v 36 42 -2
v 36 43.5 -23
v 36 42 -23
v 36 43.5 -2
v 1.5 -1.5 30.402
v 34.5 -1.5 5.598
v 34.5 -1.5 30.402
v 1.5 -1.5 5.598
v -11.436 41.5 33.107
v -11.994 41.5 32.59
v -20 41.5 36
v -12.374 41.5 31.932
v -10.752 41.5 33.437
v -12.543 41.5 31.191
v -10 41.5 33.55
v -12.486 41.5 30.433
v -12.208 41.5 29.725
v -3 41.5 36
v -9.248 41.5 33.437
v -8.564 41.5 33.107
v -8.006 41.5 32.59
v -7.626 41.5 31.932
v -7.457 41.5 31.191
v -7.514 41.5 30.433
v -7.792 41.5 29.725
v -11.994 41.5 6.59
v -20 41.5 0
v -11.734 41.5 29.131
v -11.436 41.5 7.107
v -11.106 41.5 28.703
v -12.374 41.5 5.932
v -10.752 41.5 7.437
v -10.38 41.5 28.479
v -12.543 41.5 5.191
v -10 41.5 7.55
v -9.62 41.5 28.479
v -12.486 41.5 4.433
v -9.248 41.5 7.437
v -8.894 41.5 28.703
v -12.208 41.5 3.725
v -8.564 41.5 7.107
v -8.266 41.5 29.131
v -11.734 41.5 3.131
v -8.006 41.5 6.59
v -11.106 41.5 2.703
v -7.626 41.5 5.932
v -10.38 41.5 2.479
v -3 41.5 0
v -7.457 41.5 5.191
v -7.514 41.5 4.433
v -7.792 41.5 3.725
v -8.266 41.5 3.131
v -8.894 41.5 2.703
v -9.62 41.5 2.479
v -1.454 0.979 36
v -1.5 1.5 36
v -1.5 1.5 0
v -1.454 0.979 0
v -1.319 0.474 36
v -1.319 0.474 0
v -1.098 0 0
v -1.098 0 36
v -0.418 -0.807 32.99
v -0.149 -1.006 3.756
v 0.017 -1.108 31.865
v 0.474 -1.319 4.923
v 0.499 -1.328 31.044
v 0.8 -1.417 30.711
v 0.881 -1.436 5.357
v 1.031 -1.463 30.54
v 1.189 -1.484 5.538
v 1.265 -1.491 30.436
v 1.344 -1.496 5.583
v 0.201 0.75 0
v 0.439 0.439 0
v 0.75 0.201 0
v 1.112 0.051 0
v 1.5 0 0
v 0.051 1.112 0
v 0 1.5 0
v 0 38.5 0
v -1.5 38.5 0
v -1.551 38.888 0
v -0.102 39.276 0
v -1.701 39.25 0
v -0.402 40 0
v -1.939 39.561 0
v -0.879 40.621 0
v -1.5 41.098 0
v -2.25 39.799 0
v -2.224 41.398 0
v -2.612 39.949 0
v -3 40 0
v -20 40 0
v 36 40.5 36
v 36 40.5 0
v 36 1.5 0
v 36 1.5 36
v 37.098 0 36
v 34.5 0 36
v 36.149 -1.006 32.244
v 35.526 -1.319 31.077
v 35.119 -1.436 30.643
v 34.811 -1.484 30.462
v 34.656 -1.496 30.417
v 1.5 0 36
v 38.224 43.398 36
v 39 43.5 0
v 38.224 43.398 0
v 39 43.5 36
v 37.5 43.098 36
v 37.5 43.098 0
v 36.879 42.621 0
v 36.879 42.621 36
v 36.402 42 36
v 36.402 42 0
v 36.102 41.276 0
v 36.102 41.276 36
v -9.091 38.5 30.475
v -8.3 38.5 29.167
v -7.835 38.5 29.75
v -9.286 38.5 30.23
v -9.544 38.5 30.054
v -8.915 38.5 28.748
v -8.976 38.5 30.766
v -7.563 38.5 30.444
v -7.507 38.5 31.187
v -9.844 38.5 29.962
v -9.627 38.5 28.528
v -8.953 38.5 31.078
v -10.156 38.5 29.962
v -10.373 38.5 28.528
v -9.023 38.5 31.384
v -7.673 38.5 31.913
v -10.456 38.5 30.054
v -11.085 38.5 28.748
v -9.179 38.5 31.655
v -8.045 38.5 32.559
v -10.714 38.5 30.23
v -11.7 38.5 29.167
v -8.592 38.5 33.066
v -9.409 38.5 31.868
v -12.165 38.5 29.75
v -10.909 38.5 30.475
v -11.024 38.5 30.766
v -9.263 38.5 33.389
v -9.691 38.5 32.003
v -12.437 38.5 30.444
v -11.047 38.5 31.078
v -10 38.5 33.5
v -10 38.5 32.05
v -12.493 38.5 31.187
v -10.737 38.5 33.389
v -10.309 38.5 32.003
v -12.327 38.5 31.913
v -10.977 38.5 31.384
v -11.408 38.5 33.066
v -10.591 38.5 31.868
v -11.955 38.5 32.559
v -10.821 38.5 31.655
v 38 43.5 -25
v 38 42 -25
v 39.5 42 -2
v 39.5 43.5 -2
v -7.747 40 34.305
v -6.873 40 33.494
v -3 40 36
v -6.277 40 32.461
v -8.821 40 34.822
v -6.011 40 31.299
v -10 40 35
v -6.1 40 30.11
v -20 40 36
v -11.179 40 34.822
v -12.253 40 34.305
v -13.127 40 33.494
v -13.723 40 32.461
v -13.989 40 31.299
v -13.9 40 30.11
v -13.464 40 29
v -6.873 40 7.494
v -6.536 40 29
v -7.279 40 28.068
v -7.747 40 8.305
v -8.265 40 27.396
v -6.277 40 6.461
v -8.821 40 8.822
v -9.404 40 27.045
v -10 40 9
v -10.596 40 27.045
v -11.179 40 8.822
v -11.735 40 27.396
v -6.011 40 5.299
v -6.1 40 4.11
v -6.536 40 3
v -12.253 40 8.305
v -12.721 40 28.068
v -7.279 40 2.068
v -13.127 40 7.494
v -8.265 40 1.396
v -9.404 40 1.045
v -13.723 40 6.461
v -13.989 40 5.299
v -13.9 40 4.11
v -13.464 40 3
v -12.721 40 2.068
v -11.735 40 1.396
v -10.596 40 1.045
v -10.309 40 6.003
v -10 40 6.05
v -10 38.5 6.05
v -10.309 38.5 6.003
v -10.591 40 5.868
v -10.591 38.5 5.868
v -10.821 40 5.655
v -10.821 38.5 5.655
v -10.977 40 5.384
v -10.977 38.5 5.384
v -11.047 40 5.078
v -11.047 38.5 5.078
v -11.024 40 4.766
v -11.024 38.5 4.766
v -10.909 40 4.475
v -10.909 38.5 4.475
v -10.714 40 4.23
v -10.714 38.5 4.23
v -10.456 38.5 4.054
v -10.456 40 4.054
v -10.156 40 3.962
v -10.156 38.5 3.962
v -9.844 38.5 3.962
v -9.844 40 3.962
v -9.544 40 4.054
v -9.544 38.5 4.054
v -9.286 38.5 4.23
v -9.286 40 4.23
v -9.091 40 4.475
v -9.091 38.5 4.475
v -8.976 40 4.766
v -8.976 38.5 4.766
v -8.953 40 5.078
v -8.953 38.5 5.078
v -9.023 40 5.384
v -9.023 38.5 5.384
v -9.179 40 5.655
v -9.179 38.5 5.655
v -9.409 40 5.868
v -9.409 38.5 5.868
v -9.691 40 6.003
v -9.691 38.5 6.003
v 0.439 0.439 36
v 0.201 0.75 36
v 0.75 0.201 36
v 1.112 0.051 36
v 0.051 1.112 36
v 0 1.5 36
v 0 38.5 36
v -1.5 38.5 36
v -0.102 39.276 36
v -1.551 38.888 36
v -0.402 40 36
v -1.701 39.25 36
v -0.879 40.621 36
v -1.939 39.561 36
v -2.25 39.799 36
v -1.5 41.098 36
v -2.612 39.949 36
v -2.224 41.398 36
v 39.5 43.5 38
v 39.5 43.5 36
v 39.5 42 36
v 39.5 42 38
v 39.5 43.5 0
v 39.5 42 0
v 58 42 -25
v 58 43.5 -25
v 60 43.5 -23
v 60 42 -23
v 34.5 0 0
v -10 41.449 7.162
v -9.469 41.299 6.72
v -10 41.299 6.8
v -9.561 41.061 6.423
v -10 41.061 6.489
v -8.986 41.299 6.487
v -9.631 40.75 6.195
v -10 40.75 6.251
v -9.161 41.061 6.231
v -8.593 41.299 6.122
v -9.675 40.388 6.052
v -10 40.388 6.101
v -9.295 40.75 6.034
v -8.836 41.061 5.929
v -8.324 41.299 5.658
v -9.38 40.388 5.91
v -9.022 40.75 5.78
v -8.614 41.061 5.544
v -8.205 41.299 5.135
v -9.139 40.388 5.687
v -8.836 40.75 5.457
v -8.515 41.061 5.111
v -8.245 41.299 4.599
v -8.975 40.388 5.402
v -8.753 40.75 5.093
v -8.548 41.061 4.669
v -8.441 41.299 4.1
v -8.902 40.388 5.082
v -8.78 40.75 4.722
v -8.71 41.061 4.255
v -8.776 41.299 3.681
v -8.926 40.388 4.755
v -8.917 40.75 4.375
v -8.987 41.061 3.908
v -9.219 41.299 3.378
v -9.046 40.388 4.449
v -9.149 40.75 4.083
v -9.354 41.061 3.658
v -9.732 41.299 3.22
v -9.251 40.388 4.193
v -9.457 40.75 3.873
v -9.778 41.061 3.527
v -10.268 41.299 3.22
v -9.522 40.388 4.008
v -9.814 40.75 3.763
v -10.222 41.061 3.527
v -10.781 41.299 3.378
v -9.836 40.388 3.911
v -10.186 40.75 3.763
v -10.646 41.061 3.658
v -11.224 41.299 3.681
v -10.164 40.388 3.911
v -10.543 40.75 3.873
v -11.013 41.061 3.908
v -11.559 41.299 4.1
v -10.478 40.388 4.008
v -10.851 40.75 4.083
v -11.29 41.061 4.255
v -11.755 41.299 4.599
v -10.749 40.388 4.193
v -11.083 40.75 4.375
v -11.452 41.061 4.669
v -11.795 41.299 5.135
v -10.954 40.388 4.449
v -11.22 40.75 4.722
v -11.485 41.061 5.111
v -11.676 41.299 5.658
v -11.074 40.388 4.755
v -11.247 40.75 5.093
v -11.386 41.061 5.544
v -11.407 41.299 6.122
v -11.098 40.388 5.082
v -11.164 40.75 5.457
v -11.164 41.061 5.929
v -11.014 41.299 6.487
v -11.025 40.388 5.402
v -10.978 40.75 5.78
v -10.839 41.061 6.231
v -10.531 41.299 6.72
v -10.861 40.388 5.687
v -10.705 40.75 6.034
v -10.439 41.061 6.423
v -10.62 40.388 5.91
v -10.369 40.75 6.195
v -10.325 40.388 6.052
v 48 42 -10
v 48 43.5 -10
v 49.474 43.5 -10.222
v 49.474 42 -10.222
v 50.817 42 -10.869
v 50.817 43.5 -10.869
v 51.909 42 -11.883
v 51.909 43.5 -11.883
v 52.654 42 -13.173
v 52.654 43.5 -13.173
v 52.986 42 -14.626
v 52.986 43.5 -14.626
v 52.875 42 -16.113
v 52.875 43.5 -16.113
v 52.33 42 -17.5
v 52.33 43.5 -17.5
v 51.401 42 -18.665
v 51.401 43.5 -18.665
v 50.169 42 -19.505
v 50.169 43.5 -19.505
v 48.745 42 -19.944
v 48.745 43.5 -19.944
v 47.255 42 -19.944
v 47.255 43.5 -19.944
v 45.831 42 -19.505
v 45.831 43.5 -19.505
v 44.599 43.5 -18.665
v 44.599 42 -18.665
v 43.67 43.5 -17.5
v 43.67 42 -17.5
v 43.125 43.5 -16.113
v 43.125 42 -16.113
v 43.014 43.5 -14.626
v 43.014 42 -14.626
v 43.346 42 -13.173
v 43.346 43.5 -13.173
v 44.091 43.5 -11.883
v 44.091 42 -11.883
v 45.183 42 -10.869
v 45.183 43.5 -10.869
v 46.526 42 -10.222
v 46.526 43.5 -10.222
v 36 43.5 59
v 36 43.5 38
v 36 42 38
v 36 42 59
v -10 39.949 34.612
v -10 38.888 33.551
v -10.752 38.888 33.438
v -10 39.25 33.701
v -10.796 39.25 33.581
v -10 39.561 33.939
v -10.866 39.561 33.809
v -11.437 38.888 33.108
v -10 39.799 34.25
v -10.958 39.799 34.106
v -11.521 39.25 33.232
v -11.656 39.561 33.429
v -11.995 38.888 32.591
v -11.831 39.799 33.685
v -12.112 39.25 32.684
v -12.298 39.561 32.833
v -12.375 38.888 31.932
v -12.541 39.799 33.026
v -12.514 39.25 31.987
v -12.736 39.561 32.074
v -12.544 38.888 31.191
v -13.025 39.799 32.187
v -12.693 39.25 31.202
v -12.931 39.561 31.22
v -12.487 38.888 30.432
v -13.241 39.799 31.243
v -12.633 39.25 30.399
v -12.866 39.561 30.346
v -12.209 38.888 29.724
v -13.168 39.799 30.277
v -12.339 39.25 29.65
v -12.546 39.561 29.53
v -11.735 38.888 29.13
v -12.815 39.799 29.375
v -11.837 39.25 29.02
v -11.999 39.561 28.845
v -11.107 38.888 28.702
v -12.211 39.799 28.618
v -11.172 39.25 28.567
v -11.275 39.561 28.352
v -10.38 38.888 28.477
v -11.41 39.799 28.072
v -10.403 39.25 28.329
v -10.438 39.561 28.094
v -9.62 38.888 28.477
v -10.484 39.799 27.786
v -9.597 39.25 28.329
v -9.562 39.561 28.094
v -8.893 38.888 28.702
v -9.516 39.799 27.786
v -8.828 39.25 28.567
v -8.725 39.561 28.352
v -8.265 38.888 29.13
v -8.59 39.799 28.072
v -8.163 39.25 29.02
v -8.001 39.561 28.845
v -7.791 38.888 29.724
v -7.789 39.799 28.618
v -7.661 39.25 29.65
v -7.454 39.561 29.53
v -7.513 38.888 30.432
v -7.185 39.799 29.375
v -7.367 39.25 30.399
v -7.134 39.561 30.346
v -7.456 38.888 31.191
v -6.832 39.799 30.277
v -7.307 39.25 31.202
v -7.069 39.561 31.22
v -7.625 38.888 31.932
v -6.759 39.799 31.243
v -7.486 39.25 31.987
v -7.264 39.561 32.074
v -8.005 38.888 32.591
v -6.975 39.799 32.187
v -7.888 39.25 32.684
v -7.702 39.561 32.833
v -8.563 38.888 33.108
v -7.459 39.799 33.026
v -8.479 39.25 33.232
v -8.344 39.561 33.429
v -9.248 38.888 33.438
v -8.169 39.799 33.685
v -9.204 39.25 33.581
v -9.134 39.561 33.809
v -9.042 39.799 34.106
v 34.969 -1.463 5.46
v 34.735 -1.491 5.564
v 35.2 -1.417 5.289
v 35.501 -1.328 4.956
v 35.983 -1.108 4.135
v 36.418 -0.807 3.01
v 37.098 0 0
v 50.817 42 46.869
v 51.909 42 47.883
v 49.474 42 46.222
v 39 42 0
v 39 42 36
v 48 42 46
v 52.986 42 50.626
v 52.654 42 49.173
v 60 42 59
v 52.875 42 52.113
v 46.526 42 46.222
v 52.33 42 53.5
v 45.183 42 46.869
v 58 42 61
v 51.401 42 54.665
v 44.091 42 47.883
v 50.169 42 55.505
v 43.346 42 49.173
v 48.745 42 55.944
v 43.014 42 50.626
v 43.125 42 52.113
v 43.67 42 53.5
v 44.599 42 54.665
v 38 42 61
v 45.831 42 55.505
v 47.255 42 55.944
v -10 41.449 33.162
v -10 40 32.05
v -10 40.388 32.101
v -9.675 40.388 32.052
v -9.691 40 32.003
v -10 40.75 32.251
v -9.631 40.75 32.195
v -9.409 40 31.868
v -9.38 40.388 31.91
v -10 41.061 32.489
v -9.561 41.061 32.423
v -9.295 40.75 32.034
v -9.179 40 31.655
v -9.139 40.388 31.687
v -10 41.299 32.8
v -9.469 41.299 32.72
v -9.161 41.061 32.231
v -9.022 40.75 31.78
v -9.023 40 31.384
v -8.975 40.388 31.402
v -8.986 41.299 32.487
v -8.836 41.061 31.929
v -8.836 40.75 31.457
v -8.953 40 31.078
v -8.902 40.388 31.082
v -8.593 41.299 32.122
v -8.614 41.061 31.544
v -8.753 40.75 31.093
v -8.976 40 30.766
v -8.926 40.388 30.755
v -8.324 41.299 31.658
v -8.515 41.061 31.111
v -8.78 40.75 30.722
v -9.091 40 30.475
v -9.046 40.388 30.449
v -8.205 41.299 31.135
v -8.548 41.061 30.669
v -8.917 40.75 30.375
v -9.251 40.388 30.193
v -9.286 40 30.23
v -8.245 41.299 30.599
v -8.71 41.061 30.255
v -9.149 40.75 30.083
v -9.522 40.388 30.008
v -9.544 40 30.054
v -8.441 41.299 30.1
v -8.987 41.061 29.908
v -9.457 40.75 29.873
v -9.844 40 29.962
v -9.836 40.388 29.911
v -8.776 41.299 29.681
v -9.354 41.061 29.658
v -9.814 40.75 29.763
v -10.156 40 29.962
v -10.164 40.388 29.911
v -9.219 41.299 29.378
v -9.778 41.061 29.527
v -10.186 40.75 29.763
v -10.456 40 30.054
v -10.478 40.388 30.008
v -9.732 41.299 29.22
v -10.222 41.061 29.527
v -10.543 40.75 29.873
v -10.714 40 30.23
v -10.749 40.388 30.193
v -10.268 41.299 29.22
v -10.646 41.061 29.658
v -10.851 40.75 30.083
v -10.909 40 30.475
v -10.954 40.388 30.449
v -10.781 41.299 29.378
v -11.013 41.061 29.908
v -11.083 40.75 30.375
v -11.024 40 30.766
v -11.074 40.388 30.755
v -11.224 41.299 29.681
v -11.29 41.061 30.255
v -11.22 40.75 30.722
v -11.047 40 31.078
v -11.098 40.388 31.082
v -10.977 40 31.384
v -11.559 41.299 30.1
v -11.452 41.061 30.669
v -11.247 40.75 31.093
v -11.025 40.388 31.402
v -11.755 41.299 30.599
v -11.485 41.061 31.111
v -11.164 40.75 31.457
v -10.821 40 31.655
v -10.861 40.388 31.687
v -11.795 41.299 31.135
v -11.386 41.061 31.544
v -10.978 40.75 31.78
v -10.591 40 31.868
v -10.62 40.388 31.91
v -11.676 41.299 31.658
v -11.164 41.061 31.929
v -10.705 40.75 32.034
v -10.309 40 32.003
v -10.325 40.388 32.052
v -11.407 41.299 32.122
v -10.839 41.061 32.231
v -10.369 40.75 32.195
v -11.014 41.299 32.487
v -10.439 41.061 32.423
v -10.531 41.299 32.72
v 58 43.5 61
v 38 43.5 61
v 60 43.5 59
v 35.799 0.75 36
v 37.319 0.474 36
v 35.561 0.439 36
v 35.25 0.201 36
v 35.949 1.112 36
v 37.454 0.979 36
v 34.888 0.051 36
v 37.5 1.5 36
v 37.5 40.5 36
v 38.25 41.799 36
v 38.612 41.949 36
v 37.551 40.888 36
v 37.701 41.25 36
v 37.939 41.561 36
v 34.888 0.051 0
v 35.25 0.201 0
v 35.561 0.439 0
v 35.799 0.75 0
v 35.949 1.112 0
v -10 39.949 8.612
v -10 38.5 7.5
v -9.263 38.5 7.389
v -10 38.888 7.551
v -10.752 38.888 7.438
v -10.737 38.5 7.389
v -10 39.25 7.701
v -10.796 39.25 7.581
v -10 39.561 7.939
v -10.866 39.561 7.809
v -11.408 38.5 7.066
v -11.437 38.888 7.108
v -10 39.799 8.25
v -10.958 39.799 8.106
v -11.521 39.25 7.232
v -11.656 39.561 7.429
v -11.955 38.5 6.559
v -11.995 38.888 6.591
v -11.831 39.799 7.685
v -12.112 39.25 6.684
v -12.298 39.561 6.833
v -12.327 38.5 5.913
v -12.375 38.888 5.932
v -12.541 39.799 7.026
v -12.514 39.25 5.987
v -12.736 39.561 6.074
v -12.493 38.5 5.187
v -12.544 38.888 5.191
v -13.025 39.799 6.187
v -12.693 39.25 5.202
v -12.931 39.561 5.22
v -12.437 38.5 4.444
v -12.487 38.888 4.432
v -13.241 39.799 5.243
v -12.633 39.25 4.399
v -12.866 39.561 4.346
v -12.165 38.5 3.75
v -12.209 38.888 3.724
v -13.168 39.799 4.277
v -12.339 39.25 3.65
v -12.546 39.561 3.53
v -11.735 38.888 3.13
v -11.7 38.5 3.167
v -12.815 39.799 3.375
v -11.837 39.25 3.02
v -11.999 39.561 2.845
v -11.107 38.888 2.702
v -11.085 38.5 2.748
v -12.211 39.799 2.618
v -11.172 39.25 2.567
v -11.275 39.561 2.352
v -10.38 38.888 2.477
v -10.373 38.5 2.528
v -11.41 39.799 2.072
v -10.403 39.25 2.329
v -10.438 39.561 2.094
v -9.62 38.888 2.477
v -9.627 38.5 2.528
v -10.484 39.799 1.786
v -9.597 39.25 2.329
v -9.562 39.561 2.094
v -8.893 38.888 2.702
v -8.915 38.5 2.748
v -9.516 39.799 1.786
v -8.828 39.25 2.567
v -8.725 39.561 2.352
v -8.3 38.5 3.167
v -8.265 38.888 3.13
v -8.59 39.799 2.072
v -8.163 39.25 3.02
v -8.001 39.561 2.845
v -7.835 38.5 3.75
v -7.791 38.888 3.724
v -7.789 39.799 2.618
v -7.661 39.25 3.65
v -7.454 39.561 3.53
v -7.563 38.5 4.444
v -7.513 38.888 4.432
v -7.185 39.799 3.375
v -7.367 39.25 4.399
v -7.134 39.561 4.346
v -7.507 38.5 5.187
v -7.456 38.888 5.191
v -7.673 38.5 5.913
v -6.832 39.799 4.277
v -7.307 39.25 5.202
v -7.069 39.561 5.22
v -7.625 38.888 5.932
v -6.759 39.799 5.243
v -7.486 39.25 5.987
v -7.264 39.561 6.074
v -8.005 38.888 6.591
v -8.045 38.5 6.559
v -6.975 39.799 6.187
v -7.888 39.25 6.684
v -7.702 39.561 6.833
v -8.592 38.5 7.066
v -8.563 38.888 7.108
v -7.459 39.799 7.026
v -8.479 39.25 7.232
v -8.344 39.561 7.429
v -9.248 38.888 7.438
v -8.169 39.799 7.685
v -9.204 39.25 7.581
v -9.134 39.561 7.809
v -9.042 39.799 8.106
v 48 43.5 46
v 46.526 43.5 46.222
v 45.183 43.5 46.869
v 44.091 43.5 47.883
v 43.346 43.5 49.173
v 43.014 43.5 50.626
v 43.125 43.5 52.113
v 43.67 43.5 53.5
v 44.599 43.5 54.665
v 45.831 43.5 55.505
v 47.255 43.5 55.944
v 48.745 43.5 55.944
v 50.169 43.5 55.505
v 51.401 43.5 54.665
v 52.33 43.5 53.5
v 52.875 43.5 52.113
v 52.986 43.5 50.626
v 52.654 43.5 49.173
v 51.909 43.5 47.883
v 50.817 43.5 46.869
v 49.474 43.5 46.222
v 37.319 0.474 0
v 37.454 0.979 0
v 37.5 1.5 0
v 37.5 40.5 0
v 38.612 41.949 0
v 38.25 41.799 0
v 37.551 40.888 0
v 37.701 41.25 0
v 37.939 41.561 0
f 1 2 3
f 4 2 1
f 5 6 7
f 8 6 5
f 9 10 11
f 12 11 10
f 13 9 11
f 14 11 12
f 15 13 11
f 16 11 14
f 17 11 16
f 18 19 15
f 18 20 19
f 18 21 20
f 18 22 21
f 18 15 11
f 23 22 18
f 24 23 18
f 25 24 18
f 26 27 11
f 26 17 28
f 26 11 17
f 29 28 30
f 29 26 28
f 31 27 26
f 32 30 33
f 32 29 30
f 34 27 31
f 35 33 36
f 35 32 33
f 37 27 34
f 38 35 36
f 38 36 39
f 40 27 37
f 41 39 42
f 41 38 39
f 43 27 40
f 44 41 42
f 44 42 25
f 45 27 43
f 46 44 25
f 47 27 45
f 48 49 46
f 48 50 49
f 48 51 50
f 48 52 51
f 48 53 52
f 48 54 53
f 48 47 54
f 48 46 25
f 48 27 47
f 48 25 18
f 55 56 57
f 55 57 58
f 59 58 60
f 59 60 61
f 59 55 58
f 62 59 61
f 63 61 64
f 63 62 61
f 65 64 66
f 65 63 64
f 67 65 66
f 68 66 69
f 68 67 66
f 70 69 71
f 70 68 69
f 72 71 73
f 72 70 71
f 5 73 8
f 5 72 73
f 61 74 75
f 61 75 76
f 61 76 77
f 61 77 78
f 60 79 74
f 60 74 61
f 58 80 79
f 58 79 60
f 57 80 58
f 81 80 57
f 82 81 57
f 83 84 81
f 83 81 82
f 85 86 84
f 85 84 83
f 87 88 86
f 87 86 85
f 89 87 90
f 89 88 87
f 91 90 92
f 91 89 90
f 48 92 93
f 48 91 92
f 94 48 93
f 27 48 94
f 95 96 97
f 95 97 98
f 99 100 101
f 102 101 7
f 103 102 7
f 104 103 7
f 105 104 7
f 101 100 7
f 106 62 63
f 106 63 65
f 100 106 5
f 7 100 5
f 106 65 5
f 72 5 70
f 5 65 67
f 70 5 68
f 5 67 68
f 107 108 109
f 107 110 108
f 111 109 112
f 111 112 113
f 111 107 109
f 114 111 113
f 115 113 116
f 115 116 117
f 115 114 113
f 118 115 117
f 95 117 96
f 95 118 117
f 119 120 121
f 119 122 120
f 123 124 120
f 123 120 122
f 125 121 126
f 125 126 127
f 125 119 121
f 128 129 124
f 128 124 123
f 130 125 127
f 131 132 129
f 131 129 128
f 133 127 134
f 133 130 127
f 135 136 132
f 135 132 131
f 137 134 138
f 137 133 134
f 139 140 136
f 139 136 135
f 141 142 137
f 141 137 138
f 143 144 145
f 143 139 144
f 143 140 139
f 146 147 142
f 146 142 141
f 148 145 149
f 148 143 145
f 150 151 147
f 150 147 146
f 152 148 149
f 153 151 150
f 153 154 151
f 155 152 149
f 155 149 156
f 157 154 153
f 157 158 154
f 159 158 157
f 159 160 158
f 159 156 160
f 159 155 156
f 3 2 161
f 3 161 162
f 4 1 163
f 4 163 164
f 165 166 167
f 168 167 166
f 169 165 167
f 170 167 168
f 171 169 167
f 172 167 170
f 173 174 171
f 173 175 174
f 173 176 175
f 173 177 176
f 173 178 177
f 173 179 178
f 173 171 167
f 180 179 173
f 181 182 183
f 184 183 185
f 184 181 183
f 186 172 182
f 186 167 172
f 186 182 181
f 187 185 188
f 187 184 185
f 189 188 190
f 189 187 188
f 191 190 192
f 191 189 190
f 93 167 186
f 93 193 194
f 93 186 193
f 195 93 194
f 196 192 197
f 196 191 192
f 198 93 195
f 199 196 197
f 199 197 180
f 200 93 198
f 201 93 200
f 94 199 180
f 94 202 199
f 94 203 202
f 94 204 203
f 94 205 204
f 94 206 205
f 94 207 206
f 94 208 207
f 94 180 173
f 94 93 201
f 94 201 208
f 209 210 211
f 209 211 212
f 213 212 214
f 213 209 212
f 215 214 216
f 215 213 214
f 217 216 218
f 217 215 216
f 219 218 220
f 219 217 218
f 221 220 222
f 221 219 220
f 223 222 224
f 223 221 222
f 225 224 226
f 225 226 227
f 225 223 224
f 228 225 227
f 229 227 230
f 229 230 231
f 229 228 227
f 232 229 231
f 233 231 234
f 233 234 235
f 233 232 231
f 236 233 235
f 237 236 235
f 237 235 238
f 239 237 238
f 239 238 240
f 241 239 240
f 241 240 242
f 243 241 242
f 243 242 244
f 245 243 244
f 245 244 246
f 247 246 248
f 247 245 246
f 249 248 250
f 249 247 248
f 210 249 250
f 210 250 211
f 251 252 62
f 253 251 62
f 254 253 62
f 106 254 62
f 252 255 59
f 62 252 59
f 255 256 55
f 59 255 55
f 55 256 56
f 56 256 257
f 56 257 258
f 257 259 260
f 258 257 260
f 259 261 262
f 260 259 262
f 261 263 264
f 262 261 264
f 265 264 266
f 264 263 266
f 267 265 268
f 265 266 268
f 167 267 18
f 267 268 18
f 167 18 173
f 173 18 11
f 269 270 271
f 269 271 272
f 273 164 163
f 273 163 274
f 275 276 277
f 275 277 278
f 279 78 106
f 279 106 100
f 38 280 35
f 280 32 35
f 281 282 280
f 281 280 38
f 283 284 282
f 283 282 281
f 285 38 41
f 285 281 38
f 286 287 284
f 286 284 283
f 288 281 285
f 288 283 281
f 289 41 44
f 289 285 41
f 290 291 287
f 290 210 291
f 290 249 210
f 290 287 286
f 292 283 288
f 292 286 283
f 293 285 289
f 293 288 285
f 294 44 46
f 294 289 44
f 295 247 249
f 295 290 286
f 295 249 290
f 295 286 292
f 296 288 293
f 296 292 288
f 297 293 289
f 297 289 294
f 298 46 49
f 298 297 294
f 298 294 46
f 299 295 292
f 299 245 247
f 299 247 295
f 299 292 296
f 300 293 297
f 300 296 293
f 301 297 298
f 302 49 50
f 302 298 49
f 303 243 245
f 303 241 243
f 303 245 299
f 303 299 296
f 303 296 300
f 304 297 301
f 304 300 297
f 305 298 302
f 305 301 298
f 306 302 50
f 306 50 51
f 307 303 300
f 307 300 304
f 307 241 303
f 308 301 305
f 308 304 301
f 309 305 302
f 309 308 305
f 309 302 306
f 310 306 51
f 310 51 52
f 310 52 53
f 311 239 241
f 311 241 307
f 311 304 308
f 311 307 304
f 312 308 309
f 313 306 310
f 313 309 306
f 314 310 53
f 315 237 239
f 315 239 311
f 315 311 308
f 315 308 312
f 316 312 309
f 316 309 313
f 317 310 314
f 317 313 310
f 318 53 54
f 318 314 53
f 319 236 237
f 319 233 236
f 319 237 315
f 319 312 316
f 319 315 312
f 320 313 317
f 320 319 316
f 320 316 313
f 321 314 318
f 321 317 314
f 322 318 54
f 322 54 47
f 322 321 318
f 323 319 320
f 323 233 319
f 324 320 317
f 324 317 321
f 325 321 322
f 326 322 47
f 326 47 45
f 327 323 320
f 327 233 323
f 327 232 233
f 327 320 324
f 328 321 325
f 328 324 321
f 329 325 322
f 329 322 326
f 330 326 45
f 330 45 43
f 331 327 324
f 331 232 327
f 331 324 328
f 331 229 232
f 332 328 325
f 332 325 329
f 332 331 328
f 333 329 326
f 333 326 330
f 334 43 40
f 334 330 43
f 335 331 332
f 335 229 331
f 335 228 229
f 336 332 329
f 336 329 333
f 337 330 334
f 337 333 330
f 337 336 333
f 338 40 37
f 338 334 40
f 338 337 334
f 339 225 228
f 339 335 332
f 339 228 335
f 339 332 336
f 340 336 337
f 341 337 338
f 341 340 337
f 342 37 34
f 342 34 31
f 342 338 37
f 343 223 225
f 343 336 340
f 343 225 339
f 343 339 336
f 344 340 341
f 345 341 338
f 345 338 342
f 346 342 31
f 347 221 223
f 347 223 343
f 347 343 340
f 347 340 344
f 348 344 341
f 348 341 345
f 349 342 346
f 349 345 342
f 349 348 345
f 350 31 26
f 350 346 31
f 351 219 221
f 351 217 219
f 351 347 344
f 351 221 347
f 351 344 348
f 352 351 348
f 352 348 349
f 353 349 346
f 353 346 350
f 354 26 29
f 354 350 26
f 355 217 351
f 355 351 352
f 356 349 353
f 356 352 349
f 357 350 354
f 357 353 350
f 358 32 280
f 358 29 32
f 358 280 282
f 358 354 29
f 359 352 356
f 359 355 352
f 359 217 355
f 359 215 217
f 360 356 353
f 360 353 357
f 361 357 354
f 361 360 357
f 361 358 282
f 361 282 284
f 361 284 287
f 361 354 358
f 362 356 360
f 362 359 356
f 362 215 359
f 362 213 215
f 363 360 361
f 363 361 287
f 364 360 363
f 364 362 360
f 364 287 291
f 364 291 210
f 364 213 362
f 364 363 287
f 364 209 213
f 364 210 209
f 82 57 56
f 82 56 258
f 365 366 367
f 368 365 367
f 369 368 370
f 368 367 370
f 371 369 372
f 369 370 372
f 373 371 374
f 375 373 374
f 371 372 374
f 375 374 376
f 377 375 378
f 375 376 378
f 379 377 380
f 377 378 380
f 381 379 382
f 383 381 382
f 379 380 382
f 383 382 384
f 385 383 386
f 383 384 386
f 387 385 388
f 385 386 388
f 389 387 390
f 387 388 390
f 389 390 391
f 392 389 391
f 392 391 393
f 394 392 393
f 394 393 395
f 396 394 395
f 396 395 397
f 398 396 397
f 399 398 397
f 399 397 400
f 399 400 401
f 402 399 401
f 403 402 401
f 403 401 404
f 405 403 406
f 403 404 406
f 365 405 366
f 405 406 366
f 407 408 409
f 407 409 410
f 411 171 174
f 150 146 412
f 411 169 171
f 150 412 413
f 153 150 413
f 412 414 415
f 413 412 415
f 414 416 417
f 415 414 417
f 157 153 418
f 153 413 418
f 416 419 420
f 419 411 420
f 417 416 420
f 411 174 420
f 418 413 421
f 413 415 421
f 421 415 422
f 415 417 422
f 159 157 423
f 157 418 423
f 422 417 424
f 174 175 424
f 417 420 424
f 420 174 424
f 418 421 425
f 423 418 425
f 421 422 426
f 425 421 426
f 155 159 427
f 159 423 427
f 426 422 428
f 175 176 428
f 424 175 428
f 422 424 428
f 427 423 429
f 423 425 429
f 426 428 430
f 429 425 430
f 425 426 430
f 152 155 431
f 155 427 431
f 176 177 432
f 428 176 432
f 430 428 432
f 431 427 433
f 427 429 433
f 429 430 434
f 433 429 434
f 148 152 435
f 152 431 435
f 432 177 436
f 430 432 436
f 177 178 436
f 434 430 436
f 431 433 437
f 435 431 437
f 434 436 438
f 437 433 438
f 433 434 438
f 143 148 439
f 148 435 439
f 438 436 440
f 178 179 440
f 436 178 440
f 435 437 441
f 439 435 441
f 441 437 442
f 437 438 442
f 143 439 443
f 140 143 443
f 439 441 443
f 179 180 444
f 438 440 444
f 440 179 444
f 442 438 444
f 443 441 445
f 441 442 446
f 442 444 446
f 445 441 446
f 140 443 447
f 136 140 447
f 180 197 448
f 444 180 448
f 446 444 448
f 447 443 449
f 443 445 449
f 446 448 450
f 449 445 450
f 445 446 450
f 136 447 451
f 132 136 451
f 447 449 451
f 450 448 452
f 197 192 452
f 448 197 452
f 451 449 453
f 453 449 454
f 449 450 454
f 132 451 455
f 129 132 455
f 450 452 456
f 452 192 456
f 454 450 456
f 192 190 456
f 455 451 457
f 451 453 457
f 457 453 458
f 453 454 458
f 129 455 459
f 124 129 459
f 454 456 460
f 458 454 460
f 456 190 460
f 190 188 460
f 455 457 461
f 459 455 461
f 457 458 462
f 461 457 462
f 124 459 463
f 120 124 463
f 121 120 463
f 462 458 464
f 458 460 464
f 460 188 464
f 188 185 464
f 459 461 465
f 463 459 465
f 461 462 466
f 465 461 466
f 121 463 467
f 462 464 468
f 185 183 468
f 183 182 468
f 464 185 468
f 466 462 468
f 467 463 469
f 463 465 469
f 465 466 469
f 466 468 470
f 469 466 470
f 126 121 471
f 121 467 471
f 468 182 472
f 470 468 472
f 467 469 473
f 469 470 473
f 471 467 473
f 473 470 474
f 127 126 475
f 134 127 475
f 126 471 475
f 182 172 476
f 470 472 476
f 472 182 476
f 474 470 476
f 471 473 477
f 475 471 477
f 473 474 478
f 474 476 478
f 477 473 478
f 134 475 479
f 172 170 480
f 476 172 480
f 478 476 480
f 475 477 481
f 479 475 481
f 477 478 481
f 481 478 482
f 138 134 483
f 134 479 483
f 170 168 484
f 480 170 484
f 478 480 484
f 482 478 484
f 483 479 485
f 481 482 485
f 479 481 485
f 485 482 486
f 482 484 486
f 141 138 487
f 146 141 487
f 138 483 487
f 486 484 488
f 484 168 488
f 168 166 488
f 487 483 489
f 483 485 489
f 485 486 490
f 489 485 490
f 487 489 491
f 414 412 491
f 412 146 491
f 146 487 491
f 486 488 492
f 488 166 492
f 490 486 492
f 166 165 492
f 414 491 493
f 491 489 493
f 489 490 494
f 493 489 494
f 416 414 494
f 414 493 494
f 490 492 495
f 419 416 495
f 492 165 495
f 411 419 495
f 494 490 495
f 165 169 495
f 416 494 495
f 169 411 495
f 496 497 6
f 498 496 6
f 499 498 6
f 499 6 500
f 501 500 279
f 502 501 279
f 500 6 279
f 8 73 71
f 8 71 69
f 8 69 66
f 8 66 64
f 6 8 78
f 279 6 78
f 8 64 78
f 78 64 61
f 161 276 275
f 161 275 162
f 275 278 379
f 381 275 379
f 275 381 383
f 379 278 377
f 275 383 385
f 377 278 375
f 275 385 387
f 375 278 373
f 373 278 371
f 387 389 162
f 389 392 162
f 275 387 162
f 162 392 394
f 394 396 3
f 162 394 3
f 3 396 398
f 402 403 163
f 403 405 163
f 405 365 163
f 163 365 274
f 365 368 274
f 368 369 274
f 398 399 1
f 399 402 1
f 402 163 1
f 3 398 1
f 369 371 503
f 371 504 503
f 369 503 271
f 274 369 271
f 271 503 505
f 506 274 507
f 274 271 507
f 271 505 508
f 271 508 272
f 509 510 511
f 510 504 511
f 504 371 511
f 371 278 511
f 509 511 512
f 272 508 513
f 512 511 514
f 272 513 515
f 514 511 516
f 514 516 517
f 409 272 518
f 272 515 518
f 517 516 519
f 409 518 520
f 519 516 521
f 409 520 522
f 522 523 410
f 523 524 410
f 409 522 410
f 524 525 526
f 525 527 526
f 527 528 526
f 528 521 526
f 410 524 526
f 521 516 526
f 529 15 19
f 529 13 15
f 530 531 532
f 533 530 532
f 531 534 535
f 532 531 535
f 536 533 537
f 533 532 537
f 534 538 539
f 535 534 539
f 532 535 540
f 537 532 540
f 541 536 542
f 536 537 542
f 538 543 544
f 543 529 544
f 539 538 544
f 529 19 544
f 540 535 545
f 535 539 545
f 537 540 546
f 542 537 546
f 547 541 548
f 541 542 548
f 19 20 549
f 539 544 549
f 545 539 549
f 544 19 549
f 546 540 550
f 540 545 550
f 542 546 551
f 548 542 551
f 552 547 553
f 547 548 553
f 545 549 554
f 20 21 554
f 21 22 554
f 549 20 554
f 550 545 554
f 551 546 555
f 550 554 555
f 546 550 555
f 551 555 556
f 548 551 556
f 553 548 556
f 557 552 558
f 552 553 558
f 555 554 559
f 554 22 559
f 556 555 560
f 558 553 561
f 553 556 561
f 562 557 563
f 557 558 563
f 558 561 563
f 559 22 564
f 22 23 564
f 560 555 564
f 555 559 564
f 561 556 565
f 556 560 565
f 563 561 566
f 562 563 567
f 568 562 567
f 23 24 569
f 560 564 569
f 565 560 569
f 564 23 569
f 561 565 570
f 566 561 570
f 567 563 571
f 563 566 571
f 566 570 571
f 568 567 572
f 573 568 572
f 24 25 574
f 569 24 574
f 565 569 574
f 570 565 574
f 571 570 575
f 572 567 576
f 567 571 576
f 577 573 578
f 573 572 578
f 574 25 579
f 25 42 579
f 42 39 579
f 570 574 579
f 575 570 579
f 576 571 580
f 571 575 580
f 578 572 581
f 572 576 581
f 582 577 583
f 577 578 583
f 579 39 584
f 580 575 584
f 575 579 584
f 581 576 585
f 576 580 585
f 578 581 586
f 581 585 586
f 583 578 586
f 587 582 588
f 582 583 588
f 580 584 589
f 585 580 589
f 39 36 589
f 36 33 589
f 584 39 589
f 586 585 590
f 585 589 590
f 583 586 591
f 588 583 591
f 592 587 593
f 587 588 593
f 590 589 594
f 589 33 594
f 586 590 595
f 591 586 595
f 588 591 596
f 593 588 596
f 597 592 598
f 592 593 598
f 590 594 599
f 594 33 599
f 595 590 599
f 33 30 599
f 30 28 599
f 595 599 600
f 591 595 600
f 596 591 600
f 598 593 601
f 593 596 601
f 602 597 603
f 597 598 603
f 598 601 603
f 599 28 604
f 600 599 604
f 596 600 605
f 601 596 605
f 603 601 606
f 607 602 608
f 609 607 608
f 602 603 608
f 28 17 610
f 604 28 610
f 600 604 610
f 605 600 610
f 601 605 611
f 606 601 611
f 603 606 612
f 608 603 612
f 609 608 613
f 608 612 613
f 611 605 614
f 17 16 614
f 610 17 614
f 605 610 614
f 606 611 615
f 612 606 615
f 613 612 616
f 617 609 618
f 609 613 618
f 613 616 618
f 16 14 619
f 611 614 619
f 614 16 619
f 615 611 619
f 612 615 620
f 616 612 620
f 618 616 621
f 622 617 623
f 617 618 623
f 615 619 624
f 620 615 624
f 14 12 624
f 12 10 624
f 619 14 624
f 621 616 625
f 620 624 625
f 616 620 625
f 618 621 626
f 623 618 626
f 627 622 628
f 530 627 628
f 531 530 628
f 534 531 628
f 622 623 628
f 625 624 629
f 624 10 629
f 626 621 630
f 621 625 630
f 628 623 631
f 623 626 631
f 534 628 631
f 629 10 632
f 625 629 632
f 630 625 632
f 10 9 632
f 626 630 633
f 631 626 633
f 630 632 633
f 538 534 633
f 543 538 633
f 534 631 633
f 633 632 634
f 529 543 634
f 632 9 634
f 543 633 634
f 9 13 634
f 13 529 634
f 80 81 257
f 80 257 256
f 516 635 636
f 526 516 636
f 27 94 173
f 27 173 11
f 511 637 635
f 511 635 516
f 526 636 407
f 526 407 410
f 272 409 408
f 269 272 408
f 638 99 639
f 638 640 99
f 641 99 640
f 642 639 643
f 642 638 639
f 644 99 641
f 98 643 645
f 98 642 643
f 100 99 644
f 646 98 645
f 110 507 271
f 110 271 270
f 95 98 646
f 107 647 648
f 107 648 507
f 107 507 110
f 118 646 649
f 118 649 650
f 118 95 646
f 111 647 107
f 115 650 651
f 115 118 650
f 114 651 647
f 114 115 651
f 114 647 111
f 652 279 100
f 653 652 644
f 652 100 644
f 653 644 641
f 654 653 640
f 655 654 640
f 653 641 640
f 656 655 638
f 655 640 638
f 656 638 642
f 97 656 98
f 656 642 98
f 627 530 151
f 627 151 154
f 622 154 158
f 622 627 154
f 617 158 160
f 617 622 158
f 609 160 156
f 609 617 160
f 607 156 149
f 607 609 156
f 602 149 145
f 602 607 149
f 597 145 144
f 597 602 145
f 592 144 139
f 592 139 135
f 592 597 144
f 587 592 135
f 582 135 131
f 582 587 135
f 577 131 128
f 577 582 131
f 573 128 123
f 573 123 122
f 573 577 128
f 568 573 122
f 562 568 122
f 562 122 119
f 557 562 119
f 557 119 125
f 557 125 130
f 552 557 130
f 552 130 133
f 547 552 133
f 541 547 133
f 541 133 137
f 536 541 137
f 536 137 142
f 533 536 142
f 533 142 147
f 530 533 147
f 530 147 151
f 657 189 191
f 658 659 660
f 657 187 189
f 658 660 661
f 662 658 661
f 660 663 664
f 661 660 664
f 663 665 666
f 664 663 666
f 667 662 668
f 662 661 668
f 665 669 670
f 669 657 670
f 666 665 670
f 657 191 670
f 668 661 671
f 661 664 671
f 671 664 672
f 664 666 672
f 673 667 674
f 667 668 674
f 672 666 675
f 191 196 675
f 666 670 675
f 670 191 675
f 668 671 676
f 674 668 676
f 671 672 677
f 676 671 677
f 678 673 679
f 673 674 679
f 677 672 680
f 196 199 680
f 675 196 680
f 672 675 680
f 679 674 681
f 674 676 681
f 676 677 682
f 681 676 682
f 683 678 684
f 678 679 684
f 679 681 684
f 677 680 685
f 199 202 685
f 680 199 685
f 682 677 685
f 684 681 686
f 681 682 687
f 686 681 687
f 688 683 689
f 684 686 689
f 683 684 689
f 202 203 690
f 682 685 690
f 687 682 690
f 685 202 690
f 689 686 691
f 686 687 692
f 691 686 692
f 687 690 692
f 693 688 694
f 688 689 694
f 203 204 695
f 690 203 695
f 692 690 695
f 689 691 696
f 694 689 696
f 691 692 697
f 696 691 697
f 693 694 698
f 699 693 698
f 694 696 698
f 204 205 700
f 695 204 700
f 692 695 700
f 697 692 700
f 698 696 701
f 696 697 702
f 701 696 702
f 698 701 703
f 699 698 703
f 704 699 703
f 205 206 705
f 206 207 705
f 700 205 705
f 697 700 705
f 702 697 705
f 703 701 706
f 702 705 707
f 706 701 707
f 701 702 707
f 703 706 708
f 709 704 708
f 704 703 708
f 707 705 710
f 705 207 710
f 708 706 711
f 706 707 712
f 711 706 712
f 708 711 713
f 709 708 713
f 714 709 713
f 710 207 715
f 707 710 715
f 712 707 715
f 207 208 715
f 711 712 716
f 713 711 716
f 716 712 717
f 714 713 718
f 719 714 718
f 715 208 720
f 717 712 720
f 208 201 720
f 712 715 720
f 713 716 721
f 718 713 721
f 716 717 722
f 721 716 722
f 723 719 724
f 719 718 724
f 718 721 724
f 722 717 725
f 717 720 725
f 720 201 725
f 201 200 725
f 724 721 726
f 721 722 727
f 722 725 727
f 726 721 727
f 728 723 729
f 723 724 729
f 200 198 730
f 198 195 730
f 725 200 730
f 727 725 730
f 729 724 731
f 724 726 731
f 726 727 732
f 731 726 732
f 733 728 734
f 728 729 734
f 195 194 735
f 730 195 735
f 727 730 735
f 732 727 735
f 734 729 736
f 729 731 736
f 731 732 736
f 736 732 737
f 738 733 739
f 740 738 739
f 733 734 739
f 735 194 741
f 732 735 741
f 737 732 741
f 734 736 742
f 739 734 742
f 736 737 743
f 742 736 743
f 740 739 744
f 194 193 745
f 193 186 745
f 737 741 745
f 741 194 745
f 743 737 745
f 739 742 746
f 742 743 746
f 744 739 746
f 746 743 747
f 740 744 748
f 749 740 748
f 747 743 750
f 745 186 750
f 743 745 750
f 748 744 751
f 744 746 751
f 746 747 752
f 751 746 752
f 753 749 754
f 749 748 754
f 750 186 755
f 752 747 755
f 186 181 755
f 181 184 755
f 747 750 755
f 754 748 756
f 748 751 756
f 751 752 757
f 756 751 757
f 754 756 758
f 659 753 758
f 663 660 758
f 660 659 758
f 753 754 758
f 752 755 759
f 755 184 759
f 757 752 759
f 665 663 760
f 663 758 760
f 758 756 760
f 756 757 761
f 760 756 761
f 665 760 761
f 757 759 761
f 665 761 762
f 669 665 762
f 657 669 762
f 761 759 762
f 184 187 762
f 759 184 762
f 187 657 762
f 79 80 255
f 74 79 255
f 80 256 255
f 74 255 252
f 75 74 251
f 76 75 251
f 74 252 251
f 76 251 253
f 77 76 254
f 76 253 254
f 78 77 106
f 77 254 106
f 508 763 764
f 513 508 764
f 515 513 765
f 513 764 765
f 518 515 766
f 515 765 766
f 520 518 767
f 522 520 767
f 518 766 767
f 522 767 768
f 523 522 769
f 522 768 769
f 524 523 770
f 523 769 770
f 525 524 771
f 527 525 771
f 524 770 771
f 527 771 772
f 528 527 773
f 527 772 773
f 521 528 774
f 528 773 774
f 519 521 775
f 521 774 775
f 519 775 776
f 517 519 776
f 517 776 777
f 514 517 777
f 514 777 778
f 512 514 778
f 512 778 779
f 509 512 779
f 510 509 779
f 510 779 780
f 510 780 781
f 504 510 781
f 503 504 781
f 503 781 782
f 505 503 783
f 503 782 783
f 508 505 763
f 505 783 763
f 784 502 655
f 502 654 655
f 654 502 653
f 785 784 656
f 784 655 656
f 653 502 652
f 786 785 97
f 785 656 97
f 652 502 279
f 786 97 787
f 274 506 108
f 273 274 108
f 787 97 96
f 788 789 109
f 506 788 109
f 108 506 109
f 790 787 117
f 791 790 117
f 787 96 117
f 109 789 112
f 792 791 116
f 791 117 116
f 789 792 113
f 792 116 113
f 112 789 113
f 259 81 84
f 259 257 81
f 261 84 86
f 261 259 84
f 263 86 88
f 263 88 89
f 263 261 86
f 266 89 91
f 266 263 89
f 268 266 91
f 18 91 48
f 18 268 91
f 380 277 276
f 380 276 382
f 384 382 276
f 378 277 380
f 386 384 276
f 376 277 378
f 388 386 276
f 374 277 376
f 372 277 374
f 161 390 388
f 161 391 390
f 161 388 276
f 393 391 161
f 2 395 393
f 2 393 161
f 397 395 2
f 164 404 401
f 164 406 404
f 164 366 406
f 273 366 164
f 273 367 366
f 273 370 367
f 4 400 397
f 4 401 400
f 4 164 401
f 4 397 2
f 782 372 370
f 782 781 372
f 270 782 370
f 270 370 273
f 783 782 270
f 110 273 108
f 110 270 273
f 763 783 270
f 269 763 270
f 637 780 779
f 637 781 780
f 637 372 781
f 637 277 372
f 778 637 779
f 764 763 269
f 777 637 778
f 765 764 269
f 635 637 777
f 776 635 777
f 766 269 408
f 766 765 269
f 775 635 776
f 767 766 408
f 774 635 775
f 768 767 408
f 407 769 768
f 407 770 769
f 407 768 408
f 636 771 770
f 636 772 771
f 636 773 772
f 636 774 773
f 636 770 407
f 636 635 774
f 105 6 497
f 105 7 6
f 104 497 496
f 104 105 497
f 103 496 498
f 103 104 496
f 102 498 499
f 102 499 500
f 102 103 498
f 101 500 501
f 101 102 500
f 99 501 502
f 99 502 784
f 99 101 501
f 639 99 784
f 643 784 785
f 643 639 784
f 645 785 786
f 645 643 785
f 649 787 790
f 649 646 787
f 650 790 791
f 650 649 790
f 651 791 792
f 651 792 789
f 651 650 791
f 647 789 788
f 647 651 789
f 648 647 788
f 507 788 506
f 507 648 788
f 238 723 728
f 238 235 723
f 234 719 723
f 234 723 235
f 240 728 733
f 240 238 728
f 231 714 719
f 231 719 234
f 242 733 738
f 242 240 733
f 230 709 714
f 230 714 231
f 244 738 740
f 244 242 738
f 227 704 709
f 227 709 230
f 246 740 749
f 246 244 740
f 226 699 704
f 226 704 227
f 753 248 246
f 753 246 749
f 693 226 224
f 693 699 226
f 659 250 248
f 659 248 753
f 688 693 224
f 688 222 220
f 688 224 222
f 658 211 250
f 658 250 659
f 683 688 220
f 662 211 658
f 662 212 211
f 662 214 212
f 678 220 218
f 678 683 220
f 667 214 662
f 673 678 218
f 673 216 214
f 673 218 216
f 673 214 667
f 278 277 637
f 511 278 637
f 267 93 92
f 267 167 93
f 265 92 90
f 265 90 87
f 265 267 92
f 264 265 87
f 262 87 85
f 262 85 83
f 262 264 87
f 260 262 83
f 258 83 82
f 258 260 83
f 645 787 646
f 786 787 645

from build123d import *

# Parameters (mm, degrees)
EXTRUDE_1_DEPTH     = 36
SKETCH_2_R          = 1.05
CUT_EXTRUDE_1_DEPTH = 35
FILLET_1_R          = 1.5
FILLET_2_R          = 3
CUT_EXTRUDE_5_DEPTH = 50
SKETCH_5_W          = 24
SKETCH_5_H          = 86
SKETCH_5_R          = 5
EXTRUDE_2_DEPTH     = 1.5
SKETCH_6_W          = 2
SKETCH_6_H          = 6.336440046
CUT_EXTRUDE_6_DEPTH = 3.5
FILLET_3_R          = 1.5
FILLET_4_R          = 3
SKETCH_7_R          = 2.5
SKETCH_7_R_2        = 1.05
EXTRUDE_3_DEPTH     = 1.5
FILLET_5_R          = 1.5
CHAMFER_1_SIZE      = 2


with BuildPart() as part:
    # Эскиз1 → Вытянуть1 (new body)
    with BuildSketch(Plane.XY):
        Polygon((-20, 41.5), (0, 41.5), (0, 0), (36, 0), (36, 43.5), (60, 43.5), (60, 42), (37.5, 42), (37.5, -1.5), (-1.5, -1.5), (-1.5, 40), (-20, 40), align=None)
    extrude(amount=EXTRUDE_1_DEPTH)

    # Эскиз2 → Вырез-Вытянуть1 (cut)
    with BuildSketch(Plane(origin=(0, 41.5, 0), x_dir=(-1, 0, 0), z_dir=(0, 1, 0))):
        with Locations(Location((10, 5, 0), (0, 0, 90))):
            Circle(SKETCH_2_R)
        with Locations(Location((10, 31, 0), (0, 0, 90))):
            Circle(SKETCH_2_R)
    extrude(amount=-CUT_EXTRUDE_1_DEPTH, mode=Mode.SUBTRACT)

    # Скругление1
    fillet_1_edges = [part.edges().sort_by_distance(p)[0] for p in [
        (0, 0, 18),
        (36, 0, 18),
        (-1.5, 40, 18),
    ]]
    fillet(fillet_1_edges, radius=FILLET_1_R)

    # Скругление2
    fillet_2_edges = [part.edges().sort_by_distance(p)[0] for p in [
        (0, 41.5, 18),
        (37.5, -1.5, 18),
        (-1.5, -1.5, 18),
    ]]
    fillet(fillet_2_edges, radius=FILLET_2_R)

    # Эскиз4 → Вырез-Вытянуть5 (cut)
    with BuildSketch(Plane.ZY.offset(1.5)):
        Polygon((36, 0), (30.401923789, -1.5), (5.598076211, -1.5), (0, 0), (0, -9.726752533), (36, -8.93099636), align=None)
    extrude(amount=-CUT_EXTRUDE_5_DEPTH, mode=Mode.SUBTRACT)

    # Эскиз5 → Вытянуть2 (add)
    with BuildSketch(Plane(origin=(0, 43.5, 0), x_dir=(-1, 0, 0), z_dir=(0, 1, 0))):
        with Locations((-48, 18)):
            Rectangle(SKETCH_5_W, SKETCH_5_H)
        with Locations(Location((-48, -15, 0), (0, 0, 90))):
            Circle(SKETCH_5_R, mode=Mode.SUBTRACT)
        with Locations(Location((-48, 51, 0), (0, 0, 270))):
            Circle(SKETCH_5_R, mode=Mode.SUBTRACT)
    extrude(amount=-EXTRUDE_2_DEPTH)

    # Эскиз6 → Вырез-Вытянуть6 (cut)
    with BuildSketch(Plane.ZY.offset(-36)):
        with Locations((37, 42.938728947)):
            Rectangle(SKETCH_6_W, SKETCH_6_H)
        with Locations((-1, 42.938728947)):
            Rectangle(SKETCH_6_W, SKETCH_6_H)
    extrude(amount=-CUT_EXTRUDE_6_DEPTH, mode=Mode.SUBTRACT)

    # Скругление3
    fillet_3_edges = [part.edges().sort_by_distance(p)[0] for p in [
        (37.5, 42, 18),
    ]]
    fillet(fillet_3_edges, radius=FILLET_3_R)

    # Скругление4
    fillet_4_edges = [part.edges().sort_by_distance(p)[0] for p in [
        (36, 43.5, 18),
    ]]
    fillet(fillet_4_edges, radius=FILLET_4_R)

    # Эскиз7 → Вытянуть3 (add)
    # profile 1 of 2: a face of its own
    with BuildSketch(Plane.XZ.offset(-40)):
        with Locations(Location((-10, 31, 0), (0, 0, 90))):
            Circle(SKETCH_7_R)
        with Locations(Location((-10, 31, 0), (0, 0, 90))):
            Circle(SKETCH_7_R_2, mode=Mode.SUBTRACT)
    # profile 2 of 2: a face of its own
    with BuildSketch(Plane.XZ.offset(-40)):
        with Locations(Location((-10, 5, 0), (0, 0, 90))):
            Circle(SKETCH_7_R)
        with Locations(Location((-10, 5, 0), (0, 0, 90))):
            Circle(SKETCH_7_R_2, mode=Mode.SUBTRACT)
    extrude(amount=EXTRUDE_3_DEPTH)

    # Скругление5
    fillet_5_edges = [part.edges().sort_by_distance(p)[0] for p in [
        (-10, 40, 28.5),
        (-10, 40, 2.5),
        (-10, 41.5, 3.95),
        (-10, 41.5, 29.95),
    ]]
    fillet(fillet_5_edges, radius=FILLET_5_R - 0.0001)  # a hair under: the kernel refuses the full size

    # Фаска1
    chamfer_1_edges = [part.edges().sort_by_distance(p)[0] for p in [
        (36, 42.75, 61),
        (36, 42.75, -25),
        (60, 42.75, -25),
        (60, 42.75, 61),
    ]]
    chamfer(chamfer_1_edges, length=CHAMFER_1_SIZE)


solid = part.part
